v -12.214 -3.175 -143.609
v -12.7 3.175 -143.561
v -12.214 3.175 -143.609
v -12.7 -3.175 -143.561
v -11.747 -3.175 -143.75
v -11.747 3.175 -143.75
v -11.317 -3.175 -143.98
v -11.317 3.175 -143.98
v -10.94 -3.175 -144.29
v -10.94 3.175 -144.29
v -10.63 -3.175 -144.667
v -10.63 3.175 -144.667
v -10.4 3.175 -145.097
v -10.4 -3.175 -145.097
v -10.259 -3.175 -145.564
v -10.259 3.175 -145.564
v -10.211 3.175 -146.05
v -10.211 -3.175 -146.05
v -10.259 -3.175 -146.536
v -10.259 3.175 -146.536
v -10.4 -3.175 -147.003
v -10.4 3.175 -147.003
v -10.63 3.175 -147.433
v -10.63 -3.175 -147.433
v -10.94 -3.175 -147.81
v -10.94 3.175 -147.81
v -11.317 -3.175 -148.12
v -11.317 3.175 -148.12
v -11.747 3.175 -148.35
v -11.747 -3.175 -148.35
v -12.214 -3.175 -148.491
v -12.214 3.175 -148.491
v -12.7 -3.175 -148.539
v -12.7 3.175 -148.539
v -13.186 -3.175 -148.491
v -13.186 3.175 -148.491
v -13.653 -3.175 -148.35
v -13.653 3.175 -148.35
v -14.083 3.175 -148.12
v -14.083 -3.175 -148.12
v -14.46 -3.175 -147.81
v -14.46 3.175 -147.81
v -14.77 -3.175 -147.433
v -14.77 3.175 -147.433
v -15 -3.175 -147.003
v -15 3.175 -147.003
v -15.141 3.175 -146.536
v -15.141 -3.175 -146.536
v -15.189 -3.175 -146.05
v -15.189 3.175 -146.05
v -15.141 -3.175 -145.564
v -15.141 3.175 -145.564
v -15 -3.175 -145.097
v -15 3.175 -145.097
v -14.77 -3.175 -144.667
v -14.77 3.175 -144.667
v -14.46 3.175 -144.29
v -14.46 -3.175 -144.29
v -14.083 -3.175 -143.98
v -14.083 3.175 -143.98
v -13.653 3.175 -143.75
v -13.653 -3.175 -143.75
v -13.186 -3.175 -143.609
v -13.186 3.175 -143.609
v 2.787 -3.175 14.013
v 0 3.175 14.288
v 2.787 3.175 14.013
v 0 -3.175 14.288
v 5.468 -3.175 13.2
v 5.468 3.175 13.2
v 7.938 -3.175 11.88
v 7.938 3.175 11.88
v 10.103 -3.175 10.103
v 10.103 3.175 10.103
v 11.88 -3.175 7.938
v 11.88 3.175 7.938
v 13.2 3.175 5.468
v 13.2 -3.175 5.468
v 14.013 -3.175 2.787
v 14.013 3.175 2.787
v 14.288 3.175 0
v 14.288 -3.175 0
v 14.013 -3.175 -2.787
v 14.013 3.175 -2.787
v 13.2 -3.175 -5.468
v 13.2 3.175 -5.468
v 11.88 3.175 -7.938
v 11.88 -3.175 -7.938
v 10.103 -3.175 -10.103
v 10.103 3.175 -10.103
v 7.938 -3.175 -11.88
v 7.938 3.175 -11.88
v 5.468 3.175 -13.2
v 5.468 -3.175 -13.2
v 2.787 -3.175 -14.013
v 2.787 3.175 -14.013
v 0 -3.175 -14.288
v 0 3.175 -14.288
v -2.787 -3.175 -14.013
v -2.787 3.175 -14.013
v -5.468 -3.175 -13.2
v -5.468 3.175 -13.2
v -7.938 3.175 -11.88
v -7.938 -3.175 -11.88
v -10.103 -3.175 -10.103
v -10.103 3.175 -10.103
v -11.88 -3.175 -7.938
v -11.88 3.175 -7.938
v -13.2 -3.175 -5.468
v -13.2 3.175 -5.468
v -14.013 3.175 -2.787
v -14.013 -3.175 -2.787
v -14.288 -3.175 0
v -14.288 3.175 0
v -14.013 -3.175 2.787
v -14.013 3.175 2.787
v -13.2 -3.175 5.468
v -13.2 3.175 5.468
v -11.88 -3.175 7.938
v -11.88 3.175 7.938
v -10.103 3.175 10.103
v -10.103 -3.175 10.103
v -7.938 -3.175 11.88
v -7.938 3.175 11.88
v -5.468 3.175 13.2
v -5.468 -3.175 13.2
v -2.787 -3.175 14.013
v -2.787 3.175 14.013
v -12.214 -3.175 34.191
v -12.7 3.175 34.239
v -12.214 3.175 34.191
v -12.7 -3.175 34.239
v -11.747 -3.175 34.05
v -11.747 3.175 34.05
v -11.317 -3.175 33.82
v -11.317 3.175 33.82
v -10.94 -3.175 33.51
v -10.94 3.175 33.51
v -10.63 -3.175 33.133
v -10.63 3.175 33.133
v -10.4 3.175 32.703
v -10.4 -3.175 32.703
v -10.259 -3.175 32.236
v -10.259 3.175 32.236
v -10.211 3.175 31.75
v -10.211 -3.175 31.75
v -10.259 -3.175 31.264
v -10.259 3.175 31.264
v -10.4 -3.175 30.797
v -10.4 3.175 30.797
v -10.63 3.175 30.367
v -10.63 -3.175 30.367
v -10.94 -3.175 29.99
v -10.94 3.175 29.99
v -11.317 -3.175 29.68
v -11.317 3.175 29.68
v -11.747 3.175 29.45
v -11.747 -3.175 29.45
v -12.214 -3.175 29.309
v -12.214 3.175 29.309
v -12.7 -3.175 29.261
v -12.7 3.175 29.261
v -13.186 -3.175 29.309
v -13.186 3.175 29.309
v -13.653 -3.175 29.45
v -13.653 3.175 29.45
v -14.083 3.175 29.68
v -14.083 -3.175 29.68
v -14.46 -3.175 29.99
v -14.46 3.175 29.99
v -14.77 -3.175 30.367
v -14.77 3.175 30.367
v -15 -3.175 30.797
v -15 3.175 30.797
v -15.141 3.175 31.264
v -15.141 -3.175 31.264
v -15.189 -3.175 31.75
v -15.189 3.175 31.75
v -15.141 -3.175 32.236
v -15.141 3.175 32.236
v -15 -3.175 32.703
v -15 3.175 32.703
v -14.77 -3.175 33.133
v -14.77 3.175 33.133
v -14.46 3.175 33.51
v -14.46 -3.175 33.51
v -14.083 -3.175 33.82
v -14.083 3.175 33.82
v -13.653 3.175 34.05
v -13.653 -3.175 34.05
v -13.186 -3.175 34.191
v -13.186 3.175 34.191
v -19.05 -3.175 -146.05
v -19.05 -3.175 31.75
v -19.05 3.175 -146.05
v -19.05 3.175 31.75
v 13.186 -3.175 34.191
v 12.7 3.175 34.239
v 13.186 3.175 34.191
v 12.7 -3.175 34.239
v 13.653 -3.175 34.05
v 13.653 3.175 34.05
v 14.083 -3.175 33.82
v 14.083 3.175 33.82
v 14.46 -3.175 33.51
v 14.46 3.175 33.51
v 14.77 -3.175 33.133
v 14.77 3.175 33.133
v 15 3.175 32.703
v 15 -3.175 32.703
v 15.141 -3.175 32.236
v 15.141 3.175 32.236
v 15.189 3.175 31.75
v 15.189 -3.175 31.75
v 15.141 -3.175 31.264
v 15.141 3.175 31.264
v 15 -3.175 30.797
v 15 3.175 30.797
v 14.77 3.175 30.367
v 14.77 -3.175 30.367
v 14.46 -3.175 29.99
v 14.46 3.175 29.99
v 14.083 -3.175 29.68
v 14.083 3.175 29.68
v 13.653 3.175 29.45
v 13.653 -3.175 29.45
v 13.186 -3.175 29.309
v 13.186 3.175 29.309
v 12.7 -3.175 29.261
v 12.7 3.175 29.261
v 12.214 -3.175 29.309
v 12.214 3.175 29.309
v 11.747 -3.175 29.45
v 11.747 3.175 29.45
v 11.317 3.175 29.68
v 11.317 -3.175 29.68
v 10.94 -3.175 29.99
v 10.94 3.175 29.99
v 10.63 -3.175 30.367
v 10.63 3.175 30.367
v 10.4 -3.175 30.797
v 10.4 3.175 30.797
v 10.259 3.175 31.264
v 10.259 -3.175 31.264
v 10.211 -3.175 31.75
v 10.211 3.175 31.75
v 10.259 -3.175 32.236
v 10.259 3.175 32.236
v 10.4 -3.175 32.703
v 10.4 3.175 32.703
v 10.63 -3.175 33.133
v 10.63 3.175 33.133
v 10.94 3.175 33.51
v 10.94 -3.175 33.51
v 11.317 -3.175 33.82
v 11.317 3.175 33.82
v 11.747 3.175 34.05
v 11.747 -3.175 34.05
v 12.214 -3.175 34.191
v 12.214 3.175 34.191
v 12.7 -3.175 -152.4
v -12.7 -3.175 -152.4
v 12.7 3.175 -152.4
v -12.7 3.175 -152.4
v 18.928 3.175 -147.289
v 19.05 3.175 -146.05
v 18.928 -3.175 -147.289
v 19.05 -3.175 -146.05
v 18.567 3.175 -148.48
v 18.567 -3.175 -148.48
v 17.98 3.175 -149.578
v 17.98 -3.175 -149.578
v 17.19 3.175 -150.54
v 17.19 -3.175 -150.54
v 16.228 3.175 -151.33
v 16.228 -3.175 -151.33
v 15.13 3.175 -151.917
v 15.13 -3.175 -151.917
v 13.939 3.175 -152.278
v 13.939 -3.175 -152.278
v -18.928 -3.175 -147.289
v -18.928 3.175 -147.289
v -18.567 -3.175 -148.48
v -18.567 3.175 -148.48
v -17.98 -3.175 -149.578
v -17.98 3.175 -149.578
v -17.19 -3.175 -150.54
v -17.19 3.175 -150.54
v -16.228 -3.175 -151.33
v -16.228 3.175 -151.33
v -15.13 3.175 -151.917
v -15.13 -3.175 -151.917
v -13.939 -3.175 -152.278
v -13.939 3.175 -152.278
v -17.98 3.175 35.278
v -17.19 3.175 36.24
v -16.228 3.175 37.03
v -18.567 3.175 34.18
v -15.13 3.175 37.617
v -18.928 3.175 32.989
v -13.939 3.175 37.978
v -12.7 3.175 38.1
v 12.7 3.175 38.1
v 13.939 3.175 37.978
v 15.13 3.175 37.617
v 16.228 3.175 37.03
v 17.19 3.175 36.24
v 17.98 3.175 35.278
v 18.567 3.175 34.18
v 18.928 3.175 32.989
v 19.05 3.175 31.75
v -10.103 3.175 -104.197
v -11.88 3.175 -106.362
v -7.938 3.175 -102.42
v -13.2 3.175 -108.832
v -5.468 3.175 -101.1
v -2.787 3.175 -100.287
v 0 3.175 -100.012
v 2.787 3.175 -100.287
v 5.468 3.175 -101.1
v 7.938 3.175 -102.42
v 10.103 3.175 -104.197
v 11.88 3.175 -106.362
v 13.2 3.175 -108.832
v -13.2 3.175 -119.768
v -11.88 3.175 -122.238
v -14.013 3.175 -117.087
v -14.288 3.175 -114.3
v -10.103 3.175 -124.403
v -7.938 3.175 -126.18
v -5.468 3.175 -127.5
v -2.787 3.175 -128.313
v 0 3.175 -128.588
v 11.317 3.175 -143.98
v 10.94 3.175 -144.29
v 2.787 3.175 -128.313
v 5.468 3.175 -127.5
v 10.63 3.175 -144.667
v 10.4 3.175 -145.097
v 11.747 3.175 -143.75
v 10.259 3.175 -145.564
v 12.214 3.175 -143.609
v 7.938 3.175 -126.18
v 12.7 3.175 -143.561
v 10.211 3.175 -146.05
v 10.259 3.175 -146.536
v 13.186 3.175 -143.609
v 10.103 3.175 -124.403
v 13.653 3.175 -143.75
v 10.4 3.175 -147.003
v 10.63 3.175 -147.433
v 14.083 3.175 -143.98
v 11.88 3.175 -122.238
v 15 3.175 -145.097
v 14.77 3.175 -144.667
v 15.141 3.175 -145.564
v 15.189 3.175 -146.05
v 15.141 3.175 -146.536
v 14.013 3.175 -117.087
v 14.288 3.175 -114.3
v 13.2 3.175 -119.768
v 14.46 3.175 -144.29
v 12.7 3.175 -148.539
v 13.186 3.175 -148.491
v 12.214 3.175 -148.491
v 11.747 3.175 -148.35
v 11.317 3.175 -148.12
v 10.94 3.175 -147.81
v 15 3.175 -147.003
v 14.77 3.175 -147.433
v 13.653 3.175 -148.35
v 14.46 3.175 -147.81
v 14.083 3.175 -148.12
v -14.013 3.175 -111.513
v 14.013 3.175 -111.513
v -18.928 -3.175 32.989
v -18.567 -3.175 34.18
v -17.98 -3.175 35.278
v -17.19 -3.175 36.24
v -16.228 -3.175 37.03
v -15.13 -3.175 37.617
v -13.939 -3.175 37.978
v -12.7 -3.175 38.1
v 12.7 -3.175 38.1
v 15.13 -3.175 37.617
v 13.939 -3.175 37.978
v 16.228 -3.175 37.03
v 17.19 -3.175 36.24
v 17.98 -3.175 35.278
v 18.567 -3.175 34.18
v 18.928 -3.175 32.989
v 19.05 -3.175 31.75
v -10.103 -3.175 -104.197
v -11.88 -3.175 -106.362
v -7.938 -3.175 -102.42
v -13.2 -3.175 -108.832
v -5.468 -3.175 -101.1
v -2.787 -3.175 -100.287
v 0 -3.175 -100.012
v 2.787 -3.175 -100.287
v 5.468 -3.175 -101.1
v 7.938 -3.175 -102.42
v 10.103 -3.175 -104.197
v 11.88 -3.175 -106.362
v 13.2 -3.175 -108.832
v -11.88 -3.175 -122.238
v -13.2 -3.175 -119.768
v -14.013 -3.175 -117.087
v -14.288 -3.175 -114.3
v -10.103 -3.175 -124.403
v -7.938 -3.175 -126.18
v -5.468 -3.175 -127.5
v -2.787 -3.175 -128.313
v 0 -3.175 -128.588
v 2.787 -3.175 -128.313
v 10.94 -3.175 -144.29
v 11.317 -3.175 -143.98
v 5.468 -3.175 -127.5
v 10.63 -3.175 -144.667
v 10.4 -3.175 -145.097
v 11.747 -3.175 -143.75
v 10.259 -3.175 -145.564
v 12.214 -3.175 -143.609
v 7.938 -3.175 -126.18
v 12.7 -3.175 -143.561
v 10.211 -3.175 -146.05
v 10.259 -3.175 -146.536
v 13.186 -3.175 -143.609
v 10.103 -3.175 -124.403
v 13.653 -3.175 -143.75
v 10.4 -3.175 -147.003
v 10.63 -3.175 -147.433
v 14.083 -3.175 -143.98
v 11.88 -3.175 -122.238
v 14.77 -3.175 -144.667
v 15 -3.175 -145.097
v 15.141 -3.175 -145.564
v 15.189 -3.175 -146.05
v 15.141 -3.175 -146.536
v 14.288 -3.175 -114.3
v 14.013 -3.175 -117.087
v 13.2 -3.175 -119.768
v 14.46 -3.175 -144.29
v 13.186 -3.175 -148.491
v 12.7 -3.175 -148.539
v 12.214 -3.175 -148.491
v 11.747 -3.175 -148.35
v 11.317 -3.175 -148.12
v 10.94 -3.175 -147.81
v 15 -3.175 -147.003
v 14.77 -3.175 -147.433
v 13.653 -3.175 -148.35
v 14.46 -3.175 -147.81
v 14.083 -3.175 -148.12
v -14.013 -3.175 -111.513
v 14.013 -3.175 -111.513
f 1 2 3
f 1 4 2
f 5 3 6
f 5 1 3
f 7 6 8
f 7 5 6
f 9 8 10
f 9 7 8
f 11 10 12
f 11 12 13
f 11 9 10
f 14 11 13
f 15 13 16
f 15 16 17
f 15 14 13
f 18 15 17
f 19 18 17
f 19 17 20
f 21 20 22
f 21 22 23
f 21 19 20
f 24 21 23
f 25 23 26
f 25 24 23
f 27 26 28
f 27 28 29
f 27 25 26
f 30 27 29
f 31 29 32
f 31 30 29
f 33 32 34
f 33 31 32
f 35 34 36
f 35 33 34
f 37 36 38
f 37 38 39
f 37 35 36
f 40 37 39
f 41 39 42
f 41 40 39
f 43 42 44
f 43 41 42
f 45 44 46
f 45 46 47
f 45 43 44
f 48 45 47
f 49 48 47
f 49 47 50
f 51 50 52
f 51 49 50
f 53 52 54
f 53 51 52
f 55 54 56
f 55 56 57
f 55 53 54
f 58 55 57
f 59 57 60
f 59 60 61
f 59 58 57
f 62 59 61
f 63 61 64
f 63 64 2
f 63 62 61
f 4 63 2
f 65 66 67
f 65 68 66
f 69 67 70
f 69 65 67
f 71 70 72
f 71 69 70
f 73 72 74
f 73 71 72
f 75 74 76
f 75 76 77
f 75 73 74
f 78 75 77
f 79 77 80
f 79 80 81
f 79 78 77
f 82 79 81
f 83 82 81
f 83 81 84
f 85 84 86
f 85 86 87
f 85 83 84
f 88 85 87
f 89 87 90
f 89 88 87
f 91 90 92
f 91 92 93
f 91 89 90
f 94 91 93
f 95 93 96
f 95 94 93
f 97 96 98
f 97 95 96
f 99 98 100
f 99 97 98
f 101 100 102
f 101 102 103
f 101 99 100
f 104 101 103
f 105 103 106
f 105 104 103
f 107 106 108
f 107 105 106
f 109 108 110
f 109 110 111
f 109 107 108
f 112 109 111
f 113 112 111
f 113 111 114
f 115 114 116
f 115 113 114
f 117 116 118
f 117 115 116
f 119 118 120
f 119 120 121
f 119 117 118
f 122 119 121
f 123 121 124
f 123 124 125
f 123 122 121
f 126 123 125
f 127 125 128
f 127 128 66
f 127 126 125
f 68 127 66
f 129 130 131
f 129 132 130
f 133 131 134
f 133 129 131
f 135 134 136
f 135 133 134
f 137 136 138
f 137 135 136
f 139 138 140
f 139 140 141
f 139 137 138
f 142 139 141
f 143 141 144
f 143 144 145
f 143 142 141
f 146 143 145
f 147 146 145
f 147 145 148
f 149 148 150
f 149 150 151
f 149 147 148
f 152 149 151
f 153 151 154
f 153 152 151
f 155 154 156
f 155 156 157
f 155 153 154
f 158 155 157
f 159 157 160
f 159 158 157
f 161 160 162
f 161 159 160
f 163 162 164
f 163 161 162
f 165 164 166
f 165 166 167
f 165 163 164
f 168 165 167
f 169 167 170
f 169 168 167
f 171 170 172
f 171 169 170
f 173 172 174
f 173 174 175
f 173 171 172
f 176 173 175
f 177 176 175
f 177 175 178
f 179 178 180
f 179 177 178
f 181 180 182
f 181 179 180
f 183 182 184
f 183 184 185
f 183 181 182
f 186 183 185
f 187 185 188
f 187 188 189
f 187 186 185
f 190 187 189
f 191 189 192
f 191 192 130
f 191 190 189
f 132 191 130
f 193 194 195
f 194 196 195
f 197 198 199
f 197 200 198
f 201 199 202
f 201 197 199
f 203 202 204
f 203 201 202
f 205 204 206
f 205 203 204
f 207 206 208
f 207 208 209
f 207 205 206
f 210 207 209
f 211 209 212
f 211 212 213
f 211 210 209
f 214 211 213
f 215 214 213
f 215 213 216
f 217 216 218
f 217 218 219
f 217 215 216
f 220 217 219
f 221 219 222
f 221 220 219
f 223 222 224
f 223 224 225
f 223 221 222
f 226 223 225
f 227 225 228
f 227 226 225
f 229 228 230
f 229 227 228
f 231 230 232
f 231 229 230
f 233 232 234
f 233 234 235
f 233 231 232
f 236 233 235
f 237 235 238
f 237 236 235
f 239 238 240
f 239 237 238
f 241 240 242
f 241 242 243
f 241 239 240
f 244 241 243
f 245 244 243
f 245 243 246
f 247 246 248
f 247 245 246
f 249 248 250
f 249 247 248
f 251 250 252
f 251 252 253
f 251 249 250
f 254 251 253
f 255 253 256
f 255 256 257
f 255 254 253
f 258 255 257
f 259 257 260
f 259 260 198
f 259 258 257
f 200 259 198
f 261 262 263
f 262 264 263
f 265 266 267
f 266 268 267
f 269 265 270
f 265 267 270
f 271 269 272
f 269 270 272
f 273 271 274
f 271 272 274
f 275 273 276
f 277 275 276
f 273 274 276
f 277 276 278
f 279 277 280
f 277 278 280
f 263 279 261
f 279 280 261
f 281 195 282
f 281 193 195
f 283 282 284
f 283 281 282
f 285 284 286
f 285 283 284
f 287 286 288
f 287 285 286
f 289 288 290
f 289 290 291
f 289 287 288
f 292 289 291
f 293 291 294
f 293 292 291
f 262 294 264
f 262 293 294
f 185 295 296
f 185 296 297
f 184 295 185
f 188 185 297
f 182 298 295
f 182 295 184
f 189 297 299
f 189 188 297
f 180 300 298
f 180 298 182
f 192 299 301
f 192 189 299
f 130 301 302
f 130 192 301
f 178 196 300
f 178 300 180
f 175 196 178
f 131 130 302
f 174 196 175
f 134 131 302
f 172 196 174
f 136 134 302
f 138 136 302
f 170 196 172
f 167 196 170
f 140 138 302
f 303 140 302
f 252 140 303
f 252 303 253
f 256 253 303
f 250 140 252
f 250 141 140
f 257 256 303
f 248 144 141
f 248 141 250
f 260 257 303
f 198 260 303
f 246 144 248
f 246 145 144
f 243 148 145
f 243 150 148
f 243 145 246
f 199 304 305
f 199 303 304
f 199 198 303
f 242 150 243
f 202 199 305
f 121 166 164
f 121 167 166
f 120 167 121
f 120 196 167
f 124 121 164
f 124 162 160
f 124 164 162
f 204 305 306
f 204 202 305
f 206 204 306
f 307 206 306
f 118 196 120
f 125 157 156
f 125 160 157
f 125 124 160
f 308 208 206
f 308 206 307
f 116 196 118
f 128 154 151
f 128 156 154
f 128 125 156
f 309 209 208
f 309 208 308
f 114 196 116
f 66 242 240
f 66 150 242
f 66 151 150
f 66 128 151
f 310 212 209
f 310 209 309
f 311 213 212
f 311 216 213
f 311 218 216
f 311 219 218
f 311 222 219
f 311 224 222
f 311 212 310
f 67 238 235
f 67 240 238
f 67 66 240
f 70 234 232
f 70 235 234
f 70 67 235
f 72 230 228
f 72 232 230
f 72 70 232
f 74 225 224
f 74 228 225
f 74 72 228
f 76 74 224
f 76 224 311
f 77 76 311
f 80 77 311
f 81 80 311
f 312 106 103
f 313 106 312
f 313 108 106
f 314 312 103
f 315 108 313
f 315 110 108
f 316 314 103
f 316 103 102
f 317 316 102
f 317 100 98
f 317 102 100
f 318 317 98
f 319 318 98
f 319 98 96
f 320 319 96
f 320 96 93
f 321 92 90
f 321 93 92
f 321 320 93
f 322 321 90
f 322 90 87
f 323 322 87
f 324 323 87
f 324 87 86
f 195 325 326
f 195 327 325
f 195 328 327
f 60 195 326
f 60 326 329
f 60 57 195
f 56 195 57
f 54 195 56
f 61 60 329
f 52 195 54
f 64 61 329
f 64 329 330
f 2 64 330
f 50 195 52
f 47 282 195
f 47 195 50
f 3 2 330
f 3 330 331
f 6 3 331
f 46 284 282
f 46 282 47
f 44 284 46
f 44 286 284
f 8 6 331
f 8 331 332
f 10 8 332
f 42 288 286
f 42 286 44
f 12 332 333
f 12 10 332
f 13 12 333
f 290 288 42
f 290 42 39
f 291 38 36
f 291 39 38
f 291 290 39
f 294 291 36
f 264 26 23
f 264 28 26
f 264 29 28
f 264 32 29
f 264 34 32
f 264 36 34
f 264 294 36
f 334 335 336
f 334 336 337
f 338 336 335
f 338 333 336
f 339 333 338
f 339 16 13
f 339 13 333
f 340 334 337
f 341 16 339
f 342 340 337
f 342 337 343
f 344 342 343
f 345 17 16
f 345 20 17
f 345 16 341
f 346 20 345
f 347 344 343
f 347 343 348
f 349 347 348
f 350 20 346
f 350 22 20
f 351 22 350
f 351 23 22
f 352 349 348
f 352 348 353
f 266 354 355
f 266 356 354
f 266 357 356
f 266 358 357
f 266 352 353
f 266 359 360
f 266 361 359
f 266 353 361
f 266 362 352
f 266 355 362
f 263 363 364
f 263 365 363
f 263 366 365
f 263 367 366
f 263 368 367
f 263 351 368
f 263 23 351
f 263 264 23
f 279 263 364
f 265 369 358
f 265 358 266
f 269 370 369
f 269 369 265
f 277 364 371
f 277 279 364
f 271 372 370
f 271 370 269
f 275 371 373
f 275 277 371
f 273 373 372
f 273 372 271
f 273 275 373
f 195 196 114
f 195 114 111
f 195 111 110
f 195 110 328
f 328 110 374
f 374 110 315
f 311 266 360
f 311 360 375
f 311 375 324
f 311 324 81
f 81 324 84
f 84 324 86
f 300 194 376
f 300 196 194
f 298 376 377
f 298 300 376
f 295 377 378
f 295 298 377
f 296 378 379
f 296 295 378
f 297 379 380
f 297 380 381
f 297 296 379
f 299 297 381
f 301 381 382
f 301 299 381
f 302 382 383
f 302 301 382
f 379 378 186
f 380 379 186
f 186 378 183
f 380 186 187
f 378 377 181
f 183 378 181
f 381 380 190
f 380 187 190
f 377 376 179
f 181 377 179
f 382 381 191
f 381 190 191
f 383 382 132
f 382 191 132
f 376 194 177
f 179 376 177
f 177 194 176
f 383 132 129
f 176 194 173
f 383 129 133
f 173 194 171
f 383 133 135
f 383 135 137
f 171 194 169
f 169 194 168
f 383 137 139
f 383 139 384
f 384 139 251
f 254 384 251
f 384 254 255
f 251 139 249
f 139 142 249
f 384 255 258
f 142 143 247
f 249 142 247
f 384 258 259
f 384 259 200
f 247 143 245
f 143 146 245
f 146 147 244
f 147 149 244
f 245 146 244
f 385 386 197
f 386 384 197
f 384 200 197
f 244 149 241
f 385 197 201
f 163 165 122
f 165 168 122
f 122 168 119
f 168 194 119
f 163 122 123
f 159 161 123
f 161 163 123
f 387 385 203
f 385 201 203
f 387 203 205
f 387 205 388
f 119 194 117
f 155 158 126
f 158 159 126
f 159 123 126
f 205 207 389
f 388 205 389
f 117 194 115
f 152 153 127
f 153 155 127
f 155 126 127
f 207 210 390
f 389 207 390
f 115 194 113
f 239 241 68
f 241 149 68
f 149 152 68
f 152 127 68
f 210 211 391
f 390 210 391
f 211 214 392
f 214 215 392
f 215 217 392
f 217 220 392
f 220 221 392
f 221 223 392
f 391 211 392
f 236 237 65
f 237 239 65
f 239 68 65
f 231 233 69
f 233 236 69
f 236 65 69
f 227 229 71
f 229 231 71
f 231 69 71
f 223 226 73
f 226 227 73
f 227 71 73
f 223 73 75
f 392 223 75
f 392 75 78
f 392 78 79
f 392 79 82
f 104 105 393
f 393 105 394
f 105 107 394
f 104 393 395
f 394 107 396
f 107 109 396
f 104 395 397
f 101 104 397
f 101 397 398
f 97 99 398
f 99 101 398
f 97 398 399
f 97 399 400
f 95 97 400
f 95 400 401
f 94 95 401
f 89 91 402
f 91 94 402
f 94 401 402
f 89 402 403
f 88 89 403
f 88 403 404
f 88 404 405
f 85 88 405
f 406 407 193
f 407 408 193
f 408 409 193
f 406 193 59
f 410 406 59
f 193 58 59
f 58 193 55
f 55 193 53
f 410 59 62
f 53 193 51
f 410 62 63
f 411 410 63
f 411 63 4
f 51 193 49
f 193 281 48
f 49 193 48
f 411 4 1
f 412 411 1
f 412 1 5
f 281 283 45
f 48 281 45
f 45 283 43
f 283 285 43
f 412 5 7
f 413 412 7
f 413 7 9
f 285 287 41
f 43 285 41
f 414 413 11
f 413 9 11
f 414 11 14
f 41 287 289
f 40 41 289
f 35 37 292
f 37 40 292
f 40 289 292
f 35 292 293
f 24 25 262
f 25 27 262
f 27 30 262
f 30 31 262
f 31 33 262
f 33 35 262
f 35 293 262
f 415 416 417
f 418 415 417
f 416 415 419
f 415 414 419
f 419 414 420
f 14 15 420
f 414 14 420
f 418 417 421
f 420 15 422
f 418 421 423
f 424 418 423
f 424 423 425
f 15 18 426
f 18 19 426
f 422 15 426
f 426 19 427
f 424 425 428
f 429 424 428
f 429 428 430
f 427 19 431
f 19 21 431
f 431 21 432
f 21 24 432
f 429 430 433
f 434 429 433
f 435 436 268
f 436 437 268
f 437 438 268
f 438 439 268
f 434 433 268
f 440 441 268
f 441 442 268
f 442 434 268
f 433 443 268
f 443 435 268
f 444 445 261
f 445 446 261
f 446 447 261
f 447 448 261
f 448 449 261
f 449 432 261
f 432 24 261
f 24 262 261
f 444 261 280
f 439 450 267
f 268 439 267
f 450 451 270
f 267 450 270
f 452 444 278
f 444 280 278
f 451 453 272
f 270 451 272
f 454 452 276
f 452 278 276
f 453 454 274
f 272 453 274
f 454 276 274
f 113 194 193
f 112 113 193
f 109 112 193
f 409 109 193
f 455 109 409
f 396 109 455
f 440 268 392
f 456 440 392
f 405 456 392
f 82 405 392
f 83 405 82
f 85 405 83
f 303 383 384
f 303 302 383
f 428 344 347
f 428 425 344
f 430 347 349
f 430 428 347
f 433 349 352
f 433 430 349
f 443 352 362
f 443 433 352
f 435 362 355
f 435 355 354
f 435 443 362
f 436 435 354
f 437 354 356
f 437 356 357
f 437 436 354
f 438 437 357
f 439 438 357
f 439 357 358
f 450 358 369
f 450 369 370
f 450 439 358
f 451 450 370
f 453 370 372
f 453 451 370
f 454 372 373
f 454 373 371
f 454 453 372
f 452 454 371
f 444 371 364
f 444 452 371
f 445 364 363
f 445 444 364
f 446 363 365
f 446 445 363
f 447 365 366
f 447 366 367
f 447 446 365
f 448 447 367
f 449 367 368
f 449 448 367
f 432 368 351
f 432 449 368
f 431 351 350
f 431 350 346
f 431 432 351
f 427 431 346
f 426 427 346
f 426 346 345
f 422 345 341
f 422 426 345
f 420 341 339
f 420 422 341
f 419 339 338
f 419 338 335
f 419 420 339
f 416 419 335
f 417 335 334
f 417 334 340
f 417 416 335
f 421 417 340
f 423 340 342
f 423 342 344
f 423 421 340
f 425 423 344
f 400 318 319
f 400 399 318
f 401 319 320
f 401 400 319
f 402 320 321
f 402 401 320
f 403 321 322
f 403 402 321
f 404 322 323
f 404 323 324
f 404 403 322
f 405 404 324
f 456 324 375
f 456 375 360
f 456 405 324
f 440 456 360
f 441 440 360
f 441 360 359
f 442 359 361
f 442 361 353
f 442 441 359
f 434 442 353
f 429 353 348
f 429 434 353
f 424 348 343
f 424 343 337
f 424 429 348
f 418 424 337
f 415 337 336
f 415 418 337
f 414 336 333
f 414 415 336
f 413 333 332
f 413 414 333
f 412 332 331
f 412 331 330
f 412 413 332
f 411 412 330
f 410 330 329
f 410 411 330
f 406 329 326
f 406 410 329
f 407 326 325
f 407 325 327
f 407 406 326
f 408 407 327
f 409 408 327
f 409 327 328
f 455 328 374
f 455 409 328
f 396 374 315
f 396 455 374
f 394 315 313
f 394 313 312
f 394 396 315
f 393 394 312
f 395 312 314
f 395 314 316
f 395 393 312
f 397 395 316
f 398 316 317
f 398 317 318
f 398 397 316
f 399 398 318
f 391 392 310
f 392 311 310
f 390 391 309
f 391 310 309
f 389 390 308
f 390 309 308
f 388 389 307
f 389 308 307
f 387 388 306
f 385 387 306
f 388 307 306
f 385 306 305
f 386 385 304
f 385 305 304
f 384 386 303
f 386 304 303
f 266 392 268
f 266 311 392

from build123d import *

# Parameters (mm, degrees)
SKETCH1_W           = 38.1
SKETCH1_H           = 190.5
SKETCH1_R           = 14.2875
SKETCH1_R_2         = 2.4892
BOSS_EXTRUDE1_DEPTH = 3.175
FILLET1_R           = 6.35


with BuildPart() as part:
    # Sketch1 → Boss-Extrude1 (new, symmetric)
    with BuildSketch(Plane(origin=(0, 0, 0), x_dir=(1, 0, 0), z_dir=(0, 1, 0))):
        with Locations((0, 57.15)):
            Rectangle(SKETCH1_W, SKETCH1_H)
        with Locations(Location((0, 0, 0), (0, 0, 270))):
            Circle(SKETCH1_R, mode=Mode.SUBTRACT)
        with Locations(Location((0, 114.3, 0), (0, 0, 270))):
            Circle(SKETCH1_R, mode=Mode.SUBTRACT)
        with Locations(Location((-12.7, 146.05, 0), (0, 0, 270))):
            Circle(SKETCH1_R_2, mode=Mode.SUBTRACT)
        with Locations(Location((12.7, 146.05, 0), (0, 0, 270))):
            Circle(SKETCH1_R_2, mode=Mode.SUBTRACT)
        with Locations(Location((-12.7, -31.75, 0), (0, 0, 270))):
            Circle(SKETCH1_R_2, mode=Mode.SUBTRACT)
        with Locations(Location((12.7, -31.75, 0), (0, 0, 270))):
            Circle(SKETCH1_R_2, mode=Mode.SUBTRACT)
    extrude(amount=BOSS_EXTRUDE1_DEPTH, both=True)

    # Fillet1
    fillet1_edges = [part.edges().sort_by_distance(p)[0] for p in [
        (-19.05, 0, -152.4),
        (19.05, 0, -152.4),
        (19.05, 0, 38.1),
        (-19.05, 0, 38.1),
    ]]
    fillet(fillet1_edges, radius=FILLET1_R)


solid = part.part
